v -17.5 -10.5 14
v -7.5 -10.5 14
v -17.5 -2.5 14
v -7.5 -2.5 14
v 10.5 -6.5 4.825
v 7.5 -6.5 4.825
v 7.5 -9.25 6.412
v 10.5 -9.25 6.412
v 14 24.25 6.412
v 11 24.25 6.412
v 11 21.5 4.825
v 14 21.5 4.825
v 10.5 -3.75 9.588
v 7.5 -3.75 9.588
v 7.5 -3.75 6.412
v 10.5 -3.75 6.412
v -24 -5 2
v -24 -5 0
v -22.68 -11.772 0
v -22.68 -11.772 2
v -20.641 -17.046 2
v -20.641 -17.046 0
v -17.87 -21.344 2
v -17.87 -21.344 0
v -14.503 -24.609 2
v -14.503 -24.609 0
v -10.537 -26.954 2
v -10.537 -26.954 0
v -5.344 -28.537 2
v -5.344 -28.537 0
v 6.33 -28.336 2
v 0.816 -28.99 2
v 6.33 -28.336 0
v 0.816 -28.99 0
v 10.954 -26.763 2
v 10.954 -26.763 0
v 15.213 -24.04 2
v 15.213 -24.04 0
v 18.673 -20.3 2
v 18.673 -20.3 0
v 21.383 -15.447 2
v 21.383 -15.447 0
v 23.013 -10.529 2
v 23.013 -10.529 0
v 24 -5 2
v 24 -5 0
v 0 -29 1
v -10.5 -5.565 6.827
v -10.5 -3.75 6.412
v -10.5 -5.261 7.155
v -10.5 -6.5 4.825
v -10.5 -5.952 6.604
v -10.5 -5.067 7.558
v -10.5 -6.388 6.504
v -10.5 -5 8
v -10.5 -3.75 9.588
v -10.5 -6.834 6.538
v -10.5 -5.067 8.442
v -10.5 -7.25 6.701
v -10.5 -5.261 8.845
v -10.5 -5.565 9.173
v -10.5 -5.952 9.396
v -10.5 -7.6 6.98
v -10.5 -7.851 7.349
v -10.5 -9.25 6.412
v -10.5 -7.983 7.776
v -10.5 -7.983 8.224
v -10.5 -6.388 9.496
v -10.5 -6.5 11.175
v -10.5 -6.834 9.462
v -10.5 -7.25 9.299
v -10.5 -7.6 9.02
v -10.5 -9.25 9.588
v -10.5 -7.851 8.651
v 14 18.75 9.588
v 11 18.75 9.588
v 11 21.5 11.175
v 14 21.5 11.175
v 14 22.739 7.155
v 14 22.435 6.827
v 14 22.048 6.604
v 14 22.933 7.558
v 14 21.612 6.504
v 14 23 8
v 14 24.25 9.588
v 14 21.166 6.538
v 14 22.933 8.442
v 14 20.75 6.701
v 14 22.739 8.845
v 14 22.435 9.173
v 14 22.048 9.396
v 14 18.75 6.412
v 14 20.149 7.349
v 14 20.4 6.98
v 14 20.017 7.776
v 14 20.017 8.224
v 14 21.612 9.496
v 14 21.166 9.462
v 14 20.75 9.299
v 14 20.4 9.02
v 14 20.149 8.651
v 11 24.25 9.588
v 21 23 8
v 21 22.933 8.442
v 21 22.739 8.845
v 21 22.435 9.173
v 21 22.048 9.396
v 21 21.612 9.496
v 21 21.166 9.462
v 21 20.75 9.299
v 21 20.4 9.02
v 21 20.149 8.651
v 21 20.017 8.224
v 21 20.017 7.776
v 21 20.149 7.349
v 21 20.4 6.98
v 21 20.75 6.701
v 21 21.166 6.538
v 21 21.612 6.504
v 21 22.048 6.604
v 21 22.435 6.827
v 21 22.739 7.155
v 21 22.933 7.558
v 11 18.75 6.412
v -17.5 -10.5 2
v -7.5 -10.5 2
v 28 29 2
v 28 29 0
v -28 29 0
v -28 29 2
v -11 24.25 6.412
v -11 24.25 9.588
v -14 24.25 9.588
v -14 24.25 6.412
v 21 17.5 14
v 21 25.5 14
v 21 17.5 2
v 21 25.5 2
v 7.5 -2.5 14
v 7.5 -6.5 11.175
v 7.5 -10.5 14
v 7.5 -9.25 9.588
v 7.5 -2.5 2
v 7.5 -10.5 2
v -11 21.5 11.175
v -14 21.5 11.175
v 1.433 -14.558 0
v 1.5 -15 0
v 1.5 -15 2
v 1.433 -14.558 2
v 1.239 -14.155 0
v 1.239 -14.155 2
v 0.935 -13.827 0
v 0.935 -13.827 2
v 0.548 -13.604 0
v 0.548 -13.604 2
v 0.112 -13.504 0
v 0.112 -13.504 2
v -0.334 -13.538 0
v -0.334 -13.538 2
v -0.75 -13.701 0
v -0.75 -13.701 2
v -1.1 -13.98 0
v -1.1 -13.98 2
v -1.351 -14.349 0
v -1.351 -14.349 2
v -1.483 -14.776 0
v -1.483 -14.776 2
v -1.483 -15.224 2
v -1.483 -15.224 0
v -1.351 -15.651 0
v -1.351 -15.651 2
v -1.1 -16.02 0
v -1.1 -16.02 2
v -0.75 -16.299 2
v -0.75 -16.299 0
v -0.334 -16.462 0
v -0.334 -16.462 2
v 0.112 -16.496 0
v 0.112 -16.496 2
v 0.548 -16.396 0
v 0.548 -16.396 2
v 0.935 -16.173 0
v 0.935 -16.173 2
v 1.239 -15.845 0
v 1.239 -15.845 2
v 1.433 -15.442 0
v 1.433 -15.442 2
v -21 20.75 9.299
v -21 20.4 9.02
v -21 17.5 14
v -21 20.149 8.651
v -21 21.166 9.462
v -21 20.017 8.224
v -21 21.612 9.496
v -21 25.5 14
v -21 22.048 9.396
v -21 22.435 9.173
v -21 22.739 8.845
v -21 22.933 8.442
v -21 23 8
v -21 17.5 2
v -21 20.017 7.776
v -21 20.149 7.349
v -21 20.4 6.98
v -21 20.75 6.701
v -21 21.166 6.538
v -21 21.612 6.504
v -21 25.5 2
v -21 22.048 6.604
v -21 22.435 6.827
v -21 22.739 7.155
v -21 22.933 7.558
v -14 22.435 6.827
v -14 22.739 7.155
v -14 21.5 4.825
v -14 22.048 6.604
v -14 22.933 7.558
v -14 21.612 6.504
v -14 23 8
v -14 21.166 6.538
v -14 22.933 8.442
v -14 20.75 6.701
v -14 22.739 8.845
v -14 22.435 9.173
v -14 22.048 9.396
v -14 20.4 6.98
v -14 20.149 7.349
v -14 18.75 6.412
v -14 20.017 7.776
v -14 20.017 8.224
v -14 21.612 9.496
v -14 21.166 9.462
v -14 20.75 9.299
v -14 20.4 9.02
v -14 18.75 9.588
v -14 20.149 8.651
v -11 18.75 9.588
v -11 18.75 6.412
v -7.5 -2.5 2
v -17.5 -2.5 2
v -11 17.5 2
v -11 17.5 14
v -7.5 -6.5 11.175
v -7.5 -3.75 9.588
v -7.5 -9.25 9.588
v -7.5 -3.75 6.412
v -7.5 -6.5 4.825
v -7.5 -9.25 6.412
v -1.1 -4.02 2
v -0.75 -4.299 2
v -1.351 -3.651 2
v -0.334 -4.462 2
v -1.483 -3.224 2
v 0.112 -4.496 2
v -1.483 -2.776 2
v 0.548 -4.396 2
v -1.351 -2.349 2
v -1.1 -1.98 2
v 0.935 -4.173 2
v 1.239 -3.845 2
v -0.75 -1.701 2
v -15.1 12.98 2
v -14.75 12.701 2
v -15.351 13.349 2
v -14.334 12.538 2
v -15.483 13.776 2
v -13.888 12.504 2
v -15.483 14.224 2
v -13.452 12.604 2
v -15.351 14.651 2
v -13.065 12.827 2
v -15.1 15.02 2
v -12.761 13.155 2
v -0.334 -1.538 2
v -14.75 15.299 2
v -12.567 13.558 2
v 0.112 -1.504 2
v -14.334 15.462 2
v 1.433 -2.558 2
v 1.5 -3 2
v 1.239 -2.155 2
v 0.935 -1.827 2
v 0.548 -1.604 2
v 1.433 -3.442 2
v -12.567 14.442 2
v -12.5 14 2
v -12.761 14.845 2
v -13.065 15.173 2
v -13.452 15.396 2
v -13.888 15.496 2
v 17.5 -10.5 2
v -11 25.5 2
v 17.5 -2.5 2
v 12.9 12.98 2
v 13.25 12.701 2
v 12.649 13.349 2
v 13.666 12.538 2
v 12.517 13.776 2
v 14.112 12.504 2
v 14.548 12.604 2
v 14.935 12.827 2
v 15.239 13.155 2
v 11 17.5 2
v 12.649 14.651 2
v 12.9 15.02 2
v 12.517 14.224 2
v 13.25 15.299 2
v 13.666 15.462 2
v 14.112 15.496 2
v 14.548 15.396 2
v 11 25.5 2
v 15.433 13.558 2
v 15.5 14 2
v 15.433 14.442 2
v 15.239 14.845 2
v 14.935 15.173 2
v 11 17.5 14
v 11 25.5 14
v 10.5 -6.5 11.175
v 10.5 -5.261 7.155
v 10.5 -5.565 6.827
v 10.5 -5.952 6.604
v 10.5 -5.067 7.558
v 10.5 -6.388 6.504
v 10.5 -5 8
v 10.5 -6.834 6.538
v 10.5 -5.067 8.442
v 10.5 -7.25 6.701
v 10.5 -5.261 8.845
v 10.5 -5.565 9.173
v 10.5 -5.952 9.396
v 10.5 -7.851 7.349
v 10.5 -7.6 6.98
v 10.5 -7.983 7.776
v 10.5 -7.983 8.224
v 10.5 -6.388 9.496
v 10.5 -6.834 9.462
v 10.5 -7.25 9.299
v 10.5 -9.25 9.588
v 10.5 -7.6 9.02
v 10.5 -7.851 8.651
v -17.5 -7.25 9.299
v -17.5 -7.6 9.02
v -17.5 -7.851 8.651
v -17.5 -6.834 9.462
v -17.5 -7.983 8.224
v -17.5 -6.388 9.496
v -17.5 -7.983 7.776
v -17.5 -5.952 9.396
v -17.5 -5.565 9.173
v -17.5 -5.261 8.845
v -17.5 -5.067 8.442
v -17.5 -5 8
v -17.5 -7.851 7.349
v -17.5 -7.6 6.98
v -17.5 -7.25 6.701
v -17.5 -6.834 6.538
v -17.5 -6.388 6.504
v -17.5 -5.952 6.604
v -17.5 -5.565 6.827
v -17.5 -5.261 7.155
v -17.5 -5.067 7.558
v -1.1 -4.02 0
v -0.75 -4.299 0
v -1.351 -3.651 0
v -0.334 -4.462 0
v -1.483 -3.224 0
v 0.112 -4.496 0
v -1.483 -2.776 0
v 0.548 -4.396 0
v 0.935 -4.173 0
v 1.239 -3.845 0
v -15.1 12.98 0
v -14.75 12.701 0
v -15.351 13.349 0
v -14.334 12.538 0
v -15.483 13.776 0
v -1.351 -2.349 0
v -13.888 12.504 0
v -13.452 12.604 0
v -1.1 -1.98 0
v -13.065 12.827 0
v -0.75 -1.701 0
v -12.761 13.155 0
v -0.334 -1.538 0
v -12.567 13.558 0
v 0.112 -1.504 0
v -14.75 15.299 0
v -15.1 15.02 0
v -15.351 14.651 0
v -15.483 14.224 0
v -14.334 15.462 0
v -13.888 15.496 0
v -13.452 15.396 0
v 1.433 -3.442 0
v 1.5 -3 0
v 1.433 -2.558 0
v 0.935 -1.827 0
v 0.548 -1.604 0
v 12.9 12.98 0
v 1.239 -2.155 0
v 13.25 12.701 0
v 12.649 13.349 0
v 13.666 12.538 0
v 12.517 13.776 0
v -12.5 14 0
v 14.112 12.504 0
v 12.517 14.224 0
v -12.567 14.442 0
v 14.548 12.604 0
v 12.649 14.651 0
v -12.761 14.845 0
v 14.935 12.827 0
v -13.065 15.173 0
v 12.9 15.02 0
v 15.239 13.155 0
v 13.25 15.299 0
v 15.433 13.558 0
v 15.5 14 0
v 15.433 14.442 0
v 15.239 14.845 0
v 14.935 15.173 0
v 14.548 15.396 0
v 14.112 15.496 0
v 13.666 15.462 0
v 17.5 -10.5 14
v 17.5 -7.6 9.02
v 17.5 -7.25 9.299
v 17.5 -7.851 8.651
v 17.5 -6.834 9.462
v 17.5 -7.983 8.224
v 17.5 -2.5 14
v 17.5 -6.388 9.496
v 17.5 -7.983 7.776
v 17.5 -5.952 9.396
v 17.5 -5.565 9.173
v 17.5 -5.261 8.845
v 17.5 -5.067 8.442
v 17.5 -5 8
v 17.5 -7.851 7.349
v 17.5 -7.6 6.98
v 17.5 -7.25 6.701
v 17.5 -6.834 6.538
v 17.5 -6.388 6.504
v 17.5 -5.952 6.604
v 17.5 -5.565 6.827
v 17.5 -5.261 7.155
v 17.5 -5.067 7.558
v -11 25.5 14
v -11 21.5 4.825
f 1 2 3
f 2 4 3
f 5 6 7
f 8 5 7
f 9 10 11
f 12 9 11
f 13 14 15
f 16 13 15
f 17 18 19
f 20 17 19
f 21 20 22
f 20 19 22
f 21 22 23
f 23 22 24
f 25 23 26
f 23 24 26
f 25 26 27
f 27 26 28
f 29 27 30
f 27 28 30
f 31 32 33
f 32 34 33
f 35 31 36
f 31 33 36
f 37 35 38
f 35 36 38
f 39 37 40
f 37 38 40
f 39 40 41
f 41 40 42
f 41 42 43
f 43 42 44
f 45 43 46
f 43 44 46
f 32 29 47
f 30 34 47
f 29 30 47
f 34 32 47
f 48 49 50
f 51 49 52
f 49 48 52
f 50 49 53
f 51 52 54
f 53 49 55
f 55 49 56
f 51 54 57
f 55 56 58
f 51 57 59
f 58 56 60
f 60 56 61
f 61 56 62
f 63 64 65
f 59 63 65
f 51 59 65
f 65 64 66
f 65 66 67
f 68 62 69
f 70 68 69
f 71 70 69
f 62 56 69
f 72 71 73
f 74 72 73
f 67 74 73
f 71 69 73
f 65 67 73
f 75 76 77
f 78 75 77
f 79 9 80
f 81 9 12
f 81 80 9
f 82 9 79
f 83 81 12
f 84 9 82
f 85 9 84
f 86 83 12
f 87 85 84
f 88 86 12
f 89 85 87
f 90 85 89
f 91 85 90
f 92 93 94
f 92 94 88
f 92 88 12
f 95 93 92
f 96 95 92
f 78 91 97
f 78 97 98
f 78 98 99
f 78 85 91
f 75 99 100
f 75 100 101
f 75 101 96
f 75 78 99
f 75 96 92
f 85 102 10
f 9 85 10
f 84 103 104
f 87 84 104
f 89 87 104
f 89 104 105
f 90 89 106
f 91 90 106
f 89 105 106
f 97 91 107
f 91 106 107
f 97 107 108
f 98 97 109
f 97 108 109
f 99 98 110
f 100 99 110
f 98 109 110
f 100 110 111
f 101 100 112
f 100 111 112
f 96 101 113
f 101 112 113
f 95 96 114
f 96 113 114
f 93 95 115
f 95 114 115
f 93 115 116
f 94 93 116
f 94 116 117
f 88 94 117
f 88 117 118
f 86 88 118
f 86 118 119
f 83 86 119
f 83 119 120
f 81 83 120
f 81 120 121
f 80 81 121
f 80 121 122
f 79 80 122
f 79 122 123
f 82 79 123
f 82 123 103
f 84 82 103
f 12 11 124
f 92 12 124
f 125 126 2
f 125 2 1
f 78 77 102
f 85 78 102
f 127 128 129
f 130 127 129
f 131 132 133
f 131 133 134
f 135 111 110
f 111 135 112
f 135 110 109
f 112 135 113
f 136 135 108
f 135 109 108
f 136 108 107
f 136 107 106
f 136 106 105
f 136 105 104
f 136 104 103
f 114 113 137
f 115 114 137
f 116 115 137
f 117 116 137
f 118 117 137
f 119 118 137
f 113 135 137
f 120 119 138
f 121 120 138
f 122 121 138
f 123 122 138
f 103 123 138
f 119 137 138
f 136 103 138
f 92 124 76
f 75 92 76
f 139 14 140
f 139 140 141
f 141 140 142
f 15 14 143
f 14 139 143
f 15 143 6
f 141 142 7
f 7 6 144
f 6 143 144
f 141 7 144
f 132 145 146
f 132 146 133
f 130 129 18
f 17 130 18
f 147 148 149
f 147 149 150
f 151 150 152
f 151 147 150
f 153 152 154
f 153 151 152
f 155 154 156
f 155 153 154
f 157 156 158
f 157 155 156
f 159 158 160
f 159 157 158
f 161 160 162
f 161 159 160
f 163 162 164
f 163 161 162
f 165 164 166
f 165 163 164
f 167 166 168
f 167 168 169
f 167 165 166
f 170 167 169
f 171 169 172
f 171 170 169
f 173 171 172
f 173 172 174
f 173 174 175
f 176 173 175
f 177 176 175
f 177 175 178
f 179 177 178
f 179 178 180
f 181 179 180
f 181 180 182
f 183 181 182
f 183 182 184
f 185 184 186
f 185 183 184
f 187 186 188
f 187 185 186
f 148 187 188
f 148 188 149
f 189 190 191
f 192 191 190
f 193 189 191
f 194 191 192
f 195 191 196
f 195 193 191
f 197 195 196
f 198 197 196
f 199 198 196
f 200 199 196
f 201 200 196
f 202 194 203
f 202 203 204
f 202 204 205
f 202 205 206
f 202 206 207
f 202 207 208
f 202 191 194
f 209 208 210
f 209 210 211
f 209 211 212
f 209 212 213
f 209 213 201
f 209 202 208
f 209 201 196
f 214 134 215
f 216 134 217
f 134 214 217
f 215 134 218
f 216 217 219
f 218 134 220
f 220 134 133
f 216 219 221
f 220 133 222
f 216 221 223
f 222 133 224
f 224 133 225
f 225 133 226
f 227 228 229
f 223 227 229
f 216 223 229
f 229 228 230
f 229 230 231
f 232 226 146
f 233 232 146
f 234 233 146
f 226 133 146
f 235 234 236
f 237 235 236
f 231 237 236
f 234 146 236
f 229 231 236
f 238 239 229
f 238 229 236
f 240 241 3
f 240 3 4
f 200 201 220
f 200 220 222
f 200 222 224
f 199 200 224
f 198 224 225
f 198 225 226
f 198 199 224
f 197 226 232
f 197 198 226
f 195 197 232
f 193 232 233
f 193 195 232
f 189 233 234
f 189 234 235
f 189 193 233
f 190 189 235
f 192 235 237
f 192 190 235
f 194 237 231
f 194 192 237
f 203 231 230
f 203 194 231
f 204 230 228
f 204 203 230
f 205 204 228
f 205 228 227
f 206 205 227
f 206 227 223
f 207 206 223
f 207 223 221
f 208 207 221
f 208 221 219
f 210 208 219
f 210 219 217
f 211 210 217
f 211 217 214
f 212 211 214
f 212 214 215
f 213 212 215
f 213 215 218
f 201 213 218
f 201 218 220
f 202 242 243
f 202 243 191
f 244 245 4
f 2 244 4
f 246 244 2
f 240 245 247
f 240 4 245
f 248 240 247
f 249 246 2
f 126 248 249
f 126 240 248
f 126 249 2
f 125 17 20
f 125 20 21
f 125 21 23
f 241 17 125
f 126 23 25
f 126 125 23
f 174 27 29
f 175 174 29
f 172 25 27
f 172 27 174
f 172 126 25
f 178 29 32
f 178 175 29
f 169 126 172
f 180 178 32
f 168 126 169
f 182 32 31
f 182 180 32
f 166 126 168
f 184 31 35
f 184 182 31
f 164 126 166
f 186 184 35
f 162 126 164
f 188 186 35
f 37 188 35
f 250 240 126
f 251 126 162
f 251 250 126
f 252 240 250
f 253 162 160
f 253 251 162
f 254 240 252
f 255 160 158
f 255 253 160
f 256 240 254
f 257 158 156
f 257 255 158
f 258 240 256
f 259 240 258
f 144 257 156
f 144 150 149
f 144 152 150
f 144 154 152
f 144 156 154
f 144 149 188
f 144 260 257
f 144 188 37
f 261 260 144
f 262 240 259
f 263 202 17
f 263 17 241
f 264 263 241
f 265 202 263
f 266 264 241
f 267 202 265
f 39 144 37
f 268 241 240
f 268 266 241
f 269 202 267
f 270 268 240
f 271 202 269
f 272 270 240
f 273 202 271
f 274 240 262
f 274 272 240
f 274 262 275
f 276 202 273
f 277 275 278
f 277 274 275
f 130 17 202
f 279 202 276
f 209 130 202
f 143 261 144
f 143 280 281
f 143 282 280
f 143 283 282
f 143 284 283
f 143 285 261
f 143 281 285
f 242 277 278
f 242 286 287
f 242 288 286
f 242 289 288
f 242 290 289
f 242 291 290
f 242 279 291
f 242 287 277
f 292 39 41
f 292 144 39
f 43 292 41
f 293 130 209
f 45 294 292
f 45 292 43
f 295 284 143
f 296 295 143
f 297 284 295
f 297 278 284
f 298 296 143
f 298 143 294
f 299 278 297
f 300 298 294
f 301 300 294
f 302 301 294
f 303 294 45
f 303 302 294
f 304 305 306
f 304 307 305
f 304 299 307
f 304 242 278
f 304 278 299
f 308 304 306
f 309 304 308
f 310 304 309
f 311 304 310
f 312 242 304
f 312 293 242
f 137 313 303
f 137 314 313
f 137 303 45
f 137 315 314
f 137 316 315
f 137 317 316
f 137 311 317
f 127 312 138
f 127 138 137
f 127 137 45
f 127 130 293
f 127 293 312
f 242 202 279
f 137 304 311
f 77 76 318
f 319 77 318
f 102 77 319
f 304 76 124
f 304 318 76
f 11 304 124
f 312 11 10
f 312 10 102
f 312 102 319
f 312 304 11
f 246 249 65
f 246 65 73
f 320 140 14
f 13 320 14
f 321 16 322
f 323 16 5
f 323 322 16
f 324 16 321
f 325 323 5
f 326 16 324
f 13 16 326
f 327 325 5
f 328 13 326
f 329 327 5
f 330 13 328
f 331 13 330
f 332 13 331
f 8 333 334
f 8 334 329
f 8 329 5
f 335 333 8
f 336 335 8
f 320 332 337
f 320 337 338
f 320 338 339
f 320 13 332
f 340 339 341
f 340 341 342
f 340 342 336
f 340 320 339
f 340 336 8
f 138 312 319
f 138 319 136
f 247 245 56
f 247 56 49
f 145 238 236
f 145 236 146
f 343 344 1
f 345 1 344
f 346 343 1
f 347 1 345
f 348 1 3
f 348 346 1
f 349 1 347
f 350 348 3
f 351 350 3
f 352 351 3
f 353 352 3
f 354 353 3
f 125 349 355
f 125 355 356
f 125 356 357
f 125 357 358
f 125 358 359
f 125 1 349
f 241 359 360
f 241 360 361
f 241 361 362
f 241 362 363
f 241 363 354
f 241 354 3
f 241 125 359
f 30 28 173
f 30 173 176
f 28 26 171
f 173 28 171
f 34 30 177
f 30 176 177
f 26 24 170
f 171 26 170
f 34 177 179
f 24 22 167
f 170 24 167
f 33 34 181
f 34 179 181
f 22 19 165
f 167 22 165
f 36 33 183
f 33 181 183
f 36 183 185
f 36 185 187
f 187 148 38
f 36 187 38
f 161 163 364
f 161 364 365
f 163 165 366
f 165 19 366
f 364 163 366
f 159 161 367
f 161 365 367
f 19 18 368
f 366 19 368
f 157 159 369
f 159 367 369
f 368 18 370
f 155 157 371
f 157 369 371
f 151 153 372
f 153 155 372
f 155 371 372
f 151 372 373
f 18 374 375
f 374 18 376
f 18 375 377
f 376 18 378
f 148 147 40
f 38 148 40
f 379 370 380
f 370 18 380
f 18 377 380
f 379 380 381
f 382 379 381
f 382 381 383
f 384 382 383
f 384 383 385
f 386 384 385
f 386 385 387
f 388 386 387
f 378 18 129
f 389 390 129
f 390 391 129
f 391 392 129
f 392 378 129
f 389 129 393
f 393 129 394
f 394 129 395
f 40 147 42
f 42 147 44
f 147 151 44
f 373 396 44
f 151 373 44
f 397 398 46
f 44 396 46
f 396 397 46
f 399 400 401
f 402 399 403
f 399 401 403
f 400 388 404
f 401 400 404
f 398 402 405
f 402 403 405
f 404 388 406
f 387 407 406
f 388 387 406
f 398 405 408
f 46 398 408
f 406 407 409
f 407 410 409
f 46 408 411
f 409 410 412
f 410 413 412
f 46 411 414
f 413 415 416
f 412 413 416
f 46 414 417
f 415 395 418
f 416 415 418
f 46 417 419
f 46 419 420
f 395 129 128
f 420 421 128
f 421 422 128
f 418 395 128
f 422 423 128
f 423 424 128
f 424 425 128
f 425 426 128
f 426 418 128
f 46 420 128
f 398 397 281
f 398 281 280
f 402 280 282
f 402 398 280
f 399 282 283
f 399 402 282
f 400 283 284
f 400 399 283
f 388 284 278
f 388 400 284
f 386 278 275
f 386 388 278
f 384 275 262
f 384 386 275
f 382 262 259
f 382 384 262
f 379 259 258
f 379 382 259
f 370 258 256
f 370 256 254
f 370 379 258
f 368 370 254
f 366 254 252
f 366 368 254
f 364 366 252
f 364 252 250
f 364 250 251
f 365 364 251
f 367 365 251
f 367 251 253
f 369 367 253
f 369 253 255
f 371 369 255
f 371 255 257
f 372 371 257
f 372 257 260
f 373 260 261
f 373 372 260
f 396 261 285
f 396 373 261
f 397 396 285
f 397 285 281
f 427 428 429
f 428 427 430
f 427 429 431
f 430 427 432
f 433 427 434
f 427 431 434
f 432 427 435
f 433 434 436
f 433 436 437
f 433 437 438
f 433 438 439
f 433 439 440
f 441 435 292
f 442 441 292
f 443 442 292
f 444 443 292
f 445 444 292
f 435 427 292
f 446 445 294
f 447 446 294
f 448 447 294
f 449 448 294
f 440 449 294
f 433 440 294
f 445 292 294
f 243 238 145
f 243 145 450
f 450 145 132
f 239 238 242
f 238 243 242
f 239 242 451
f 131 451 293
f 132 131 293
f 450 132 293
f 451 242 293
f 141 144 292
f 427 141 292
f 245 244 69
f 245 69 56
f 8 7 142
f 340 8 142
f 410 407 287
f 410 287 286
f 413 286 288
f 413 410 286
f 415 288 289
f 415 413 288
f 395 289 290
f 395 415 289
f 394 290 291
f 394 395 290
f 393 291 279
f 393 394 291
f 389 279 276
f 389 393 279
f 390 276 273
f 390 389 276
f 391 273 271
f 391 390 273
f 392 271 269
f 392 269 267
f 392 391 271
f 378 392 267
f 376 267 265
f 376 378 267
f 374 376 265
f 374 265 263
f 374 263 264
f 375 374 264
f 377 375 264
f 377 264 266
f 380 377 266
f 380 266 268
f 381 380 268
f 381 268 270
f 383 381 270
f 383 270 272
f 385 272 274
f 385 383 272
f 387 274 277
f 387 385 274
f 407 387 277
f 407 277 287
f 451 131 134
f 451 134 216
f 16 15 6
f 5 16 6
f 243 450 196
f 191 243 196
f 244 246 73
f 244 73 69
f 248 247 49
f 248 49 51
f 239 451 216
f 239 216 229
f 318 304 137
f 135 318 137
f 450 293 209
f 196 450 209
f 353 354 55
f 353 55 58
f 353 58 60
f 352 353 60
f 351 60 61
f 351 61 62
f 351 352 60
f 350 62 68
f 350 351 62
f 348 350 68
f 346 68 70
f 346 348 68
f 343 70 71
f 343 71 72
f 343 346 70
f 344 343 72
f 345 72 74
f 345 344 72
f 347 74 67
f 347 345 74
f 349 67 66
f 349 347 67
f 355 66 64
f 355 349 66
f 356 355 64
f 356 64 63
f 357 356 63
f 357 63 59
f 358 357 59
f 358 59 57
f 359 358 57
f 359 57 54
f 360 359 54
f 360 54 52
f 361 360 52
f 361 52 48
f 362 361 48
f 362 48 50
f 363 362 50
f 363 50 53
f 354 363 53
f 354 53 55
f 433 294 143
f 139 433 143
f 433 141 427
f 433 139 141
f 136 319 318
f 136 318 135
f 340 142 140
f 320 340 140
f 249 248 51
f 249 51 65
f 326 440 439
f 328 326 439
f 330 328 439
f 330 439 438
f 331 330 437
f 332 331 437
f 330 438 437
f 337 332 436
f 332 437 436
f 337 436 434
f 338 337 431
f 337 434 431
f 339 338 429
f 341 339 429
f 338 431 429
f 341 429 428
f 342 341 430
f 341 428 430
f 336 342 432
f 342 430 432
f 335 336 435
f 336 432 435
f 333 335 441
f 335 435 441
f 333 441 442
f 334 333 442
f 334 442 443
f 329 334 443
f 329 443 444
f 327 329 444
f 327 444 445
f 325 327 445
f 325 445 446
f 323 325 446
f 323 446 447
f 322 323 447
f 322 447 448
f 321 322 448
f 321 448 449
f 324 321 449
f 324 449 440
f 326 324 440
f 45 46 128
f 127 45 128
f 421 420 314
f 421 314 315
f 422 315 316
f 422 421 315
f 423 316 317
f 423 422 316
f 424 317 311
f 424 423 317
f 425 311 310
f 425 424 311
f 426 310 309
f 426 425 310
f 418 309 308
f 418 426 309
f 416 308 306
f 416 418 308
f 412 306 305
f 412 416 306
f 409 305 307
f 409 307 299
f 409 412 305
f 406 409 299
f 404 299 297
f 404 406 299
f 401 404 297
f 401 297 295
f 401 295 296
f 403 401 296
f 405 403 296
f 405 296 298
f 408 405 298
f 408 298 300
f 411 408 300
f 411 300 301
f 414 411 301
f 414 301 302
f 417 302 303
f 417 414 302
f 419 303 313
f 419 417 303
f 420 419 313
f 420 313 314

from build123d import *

# Parameters (mm, degrees)
F0_R      = 1.5
F1_DEPTH  = 2
F2_W      = 10
F2_H      = 8
F3_DEPTH  = 12
F4_R      = 1.5
F5_DEPTH  = 10
F6_R      = 1.5
F7_DEPTH  = 10
F9_DEPTH  = 3
F12_DEPTH = 3


with BuildPart() as f1:
    # F0 (on Top) → F1 (new body)
    with BuildSketch(Plane.XY):
        with BuildLine():
            Line((24, -5), (28, 29))
            Line((28, 29), (-28, 29))
            Line((-28, 29), (-24, -5))
            add(Edge.make_bspline(
                [(-24, -5), (-22.3147002161, -19.6341091543), (-14.6526051685, -29), (0, -29)],
                knots=[0, 0, 0, 0, 33.941125497, 33.941125497, 33.941125497, 33.941125497], degree=3))
            add(Edge.make_bspline(
                [(24, -5), (22.3147002161, -19.6341091543), (14.6526051685, -29), (0, -29)],
                knots=[0, 0, 0, 0, 33.941125497, 33.941125497, 33.941125497, 33.941125497], degree=3))
        make_face()
        with Locations((0, -15)):
            Circle(F0_R, mode=Mode.SUBTRACT)
        with Locations((0, -3)):
            Circle(F0_R, mode=Mode.SUBTRACT)
        with Locations((-14, 14)):
            Circle(F0_R, mode=Mode.SUBTRACT)
        with Locations((14, 14)):
            Circle(F0_R, mode=Mode.SUBTRACT)
    extrude(amount=F1_DEPTH)

    # F10: F3 across plane


with BuildPart() as f3:
    # F2 (on face) → F3 (new body)
    with BuildSketch(Plane.XY.offset(2)):
        with Locations((16, 21.5)):
            Rectangle(F2_W, F2_H)
    extrude(amount=F3_DEPTH)

    # F4 (on face) → F5 (cut, through all)
    with BuildSketch(Plane.YZ.offset(21)):
        with Locations((21.5, 8)):
            Circle(F4_R)
    extrude(amount=-F5_DEPTH, mode=Mode.SUBTRACT)

    # F8 (on face) → F9 (cut)
    with BuildSketch(Plane(origin=(11, 0, 0), x_dir=(0, -1, 0), z_dir=(-1, 0, 0))):
        Polygon((-21.5, 4.8245735195), (-18.75, 6.4122867597), (-18.75, 9.5877132403), (-21.5, 11.1754264805), (-24.25, 9.5877132403), (-24.25, 6.4122867597), align=None)
    extrude(amount=-F9_DEPTH, mode=Mode.SUBTRACT)


with BuildPart() as f3b:
    # F2 (on face) → F3, piece 2 (new body)
    with BuildSketch(Plane.XY.offset(2)):
        Polygon((7.5, -10.5), (17.5, -10.5), (17.5, -6.5), (17.5, -2.5), (7.5, -2.5), (7.5, -6.5), align=None)
    extrude(amount=F3_DEPTH)

    # F6 (on face) → F7 (cut, through all)
    with BuildSketch(Plane.YZ.offset(17.5)):
        with Locations((-6.5, 8)):
            Circle(F6_R)
    extrude(amount=-F7_DEPTH, mode=Mode.SUBTRACT)

    # F11 (on face) → F12 (cut)
    with BuildSketch(Plane(origin=(7.5, 0, 0), x_dir=(0, -1, 0), z_dir=(-1, 0, 0))):
        Polygon((9.2500000001, 9.5877132403), (6.5, 11.1754264805), (3.7500000001, 9.5877132402), (3.7500000002, 6.4122867597), (6.5000000002, 4.8245735195), (9.2500000002, 6.4122867598), align=None)
    extrude(amount=-F12_DEPTH, mode=Mode.SUBTRACT)


with BuildPart() as f1_1:
    add(f1.part)
    add(f3.part.mirror(Plane.YZ))


    add(f3.part)  # F13 merges F3

    add(f3b.part)  # F13 merges F3b
    # F13: F3b across plane
    add(f3b.part.mirror(Plane.YZ))


solid = f1_1.part
